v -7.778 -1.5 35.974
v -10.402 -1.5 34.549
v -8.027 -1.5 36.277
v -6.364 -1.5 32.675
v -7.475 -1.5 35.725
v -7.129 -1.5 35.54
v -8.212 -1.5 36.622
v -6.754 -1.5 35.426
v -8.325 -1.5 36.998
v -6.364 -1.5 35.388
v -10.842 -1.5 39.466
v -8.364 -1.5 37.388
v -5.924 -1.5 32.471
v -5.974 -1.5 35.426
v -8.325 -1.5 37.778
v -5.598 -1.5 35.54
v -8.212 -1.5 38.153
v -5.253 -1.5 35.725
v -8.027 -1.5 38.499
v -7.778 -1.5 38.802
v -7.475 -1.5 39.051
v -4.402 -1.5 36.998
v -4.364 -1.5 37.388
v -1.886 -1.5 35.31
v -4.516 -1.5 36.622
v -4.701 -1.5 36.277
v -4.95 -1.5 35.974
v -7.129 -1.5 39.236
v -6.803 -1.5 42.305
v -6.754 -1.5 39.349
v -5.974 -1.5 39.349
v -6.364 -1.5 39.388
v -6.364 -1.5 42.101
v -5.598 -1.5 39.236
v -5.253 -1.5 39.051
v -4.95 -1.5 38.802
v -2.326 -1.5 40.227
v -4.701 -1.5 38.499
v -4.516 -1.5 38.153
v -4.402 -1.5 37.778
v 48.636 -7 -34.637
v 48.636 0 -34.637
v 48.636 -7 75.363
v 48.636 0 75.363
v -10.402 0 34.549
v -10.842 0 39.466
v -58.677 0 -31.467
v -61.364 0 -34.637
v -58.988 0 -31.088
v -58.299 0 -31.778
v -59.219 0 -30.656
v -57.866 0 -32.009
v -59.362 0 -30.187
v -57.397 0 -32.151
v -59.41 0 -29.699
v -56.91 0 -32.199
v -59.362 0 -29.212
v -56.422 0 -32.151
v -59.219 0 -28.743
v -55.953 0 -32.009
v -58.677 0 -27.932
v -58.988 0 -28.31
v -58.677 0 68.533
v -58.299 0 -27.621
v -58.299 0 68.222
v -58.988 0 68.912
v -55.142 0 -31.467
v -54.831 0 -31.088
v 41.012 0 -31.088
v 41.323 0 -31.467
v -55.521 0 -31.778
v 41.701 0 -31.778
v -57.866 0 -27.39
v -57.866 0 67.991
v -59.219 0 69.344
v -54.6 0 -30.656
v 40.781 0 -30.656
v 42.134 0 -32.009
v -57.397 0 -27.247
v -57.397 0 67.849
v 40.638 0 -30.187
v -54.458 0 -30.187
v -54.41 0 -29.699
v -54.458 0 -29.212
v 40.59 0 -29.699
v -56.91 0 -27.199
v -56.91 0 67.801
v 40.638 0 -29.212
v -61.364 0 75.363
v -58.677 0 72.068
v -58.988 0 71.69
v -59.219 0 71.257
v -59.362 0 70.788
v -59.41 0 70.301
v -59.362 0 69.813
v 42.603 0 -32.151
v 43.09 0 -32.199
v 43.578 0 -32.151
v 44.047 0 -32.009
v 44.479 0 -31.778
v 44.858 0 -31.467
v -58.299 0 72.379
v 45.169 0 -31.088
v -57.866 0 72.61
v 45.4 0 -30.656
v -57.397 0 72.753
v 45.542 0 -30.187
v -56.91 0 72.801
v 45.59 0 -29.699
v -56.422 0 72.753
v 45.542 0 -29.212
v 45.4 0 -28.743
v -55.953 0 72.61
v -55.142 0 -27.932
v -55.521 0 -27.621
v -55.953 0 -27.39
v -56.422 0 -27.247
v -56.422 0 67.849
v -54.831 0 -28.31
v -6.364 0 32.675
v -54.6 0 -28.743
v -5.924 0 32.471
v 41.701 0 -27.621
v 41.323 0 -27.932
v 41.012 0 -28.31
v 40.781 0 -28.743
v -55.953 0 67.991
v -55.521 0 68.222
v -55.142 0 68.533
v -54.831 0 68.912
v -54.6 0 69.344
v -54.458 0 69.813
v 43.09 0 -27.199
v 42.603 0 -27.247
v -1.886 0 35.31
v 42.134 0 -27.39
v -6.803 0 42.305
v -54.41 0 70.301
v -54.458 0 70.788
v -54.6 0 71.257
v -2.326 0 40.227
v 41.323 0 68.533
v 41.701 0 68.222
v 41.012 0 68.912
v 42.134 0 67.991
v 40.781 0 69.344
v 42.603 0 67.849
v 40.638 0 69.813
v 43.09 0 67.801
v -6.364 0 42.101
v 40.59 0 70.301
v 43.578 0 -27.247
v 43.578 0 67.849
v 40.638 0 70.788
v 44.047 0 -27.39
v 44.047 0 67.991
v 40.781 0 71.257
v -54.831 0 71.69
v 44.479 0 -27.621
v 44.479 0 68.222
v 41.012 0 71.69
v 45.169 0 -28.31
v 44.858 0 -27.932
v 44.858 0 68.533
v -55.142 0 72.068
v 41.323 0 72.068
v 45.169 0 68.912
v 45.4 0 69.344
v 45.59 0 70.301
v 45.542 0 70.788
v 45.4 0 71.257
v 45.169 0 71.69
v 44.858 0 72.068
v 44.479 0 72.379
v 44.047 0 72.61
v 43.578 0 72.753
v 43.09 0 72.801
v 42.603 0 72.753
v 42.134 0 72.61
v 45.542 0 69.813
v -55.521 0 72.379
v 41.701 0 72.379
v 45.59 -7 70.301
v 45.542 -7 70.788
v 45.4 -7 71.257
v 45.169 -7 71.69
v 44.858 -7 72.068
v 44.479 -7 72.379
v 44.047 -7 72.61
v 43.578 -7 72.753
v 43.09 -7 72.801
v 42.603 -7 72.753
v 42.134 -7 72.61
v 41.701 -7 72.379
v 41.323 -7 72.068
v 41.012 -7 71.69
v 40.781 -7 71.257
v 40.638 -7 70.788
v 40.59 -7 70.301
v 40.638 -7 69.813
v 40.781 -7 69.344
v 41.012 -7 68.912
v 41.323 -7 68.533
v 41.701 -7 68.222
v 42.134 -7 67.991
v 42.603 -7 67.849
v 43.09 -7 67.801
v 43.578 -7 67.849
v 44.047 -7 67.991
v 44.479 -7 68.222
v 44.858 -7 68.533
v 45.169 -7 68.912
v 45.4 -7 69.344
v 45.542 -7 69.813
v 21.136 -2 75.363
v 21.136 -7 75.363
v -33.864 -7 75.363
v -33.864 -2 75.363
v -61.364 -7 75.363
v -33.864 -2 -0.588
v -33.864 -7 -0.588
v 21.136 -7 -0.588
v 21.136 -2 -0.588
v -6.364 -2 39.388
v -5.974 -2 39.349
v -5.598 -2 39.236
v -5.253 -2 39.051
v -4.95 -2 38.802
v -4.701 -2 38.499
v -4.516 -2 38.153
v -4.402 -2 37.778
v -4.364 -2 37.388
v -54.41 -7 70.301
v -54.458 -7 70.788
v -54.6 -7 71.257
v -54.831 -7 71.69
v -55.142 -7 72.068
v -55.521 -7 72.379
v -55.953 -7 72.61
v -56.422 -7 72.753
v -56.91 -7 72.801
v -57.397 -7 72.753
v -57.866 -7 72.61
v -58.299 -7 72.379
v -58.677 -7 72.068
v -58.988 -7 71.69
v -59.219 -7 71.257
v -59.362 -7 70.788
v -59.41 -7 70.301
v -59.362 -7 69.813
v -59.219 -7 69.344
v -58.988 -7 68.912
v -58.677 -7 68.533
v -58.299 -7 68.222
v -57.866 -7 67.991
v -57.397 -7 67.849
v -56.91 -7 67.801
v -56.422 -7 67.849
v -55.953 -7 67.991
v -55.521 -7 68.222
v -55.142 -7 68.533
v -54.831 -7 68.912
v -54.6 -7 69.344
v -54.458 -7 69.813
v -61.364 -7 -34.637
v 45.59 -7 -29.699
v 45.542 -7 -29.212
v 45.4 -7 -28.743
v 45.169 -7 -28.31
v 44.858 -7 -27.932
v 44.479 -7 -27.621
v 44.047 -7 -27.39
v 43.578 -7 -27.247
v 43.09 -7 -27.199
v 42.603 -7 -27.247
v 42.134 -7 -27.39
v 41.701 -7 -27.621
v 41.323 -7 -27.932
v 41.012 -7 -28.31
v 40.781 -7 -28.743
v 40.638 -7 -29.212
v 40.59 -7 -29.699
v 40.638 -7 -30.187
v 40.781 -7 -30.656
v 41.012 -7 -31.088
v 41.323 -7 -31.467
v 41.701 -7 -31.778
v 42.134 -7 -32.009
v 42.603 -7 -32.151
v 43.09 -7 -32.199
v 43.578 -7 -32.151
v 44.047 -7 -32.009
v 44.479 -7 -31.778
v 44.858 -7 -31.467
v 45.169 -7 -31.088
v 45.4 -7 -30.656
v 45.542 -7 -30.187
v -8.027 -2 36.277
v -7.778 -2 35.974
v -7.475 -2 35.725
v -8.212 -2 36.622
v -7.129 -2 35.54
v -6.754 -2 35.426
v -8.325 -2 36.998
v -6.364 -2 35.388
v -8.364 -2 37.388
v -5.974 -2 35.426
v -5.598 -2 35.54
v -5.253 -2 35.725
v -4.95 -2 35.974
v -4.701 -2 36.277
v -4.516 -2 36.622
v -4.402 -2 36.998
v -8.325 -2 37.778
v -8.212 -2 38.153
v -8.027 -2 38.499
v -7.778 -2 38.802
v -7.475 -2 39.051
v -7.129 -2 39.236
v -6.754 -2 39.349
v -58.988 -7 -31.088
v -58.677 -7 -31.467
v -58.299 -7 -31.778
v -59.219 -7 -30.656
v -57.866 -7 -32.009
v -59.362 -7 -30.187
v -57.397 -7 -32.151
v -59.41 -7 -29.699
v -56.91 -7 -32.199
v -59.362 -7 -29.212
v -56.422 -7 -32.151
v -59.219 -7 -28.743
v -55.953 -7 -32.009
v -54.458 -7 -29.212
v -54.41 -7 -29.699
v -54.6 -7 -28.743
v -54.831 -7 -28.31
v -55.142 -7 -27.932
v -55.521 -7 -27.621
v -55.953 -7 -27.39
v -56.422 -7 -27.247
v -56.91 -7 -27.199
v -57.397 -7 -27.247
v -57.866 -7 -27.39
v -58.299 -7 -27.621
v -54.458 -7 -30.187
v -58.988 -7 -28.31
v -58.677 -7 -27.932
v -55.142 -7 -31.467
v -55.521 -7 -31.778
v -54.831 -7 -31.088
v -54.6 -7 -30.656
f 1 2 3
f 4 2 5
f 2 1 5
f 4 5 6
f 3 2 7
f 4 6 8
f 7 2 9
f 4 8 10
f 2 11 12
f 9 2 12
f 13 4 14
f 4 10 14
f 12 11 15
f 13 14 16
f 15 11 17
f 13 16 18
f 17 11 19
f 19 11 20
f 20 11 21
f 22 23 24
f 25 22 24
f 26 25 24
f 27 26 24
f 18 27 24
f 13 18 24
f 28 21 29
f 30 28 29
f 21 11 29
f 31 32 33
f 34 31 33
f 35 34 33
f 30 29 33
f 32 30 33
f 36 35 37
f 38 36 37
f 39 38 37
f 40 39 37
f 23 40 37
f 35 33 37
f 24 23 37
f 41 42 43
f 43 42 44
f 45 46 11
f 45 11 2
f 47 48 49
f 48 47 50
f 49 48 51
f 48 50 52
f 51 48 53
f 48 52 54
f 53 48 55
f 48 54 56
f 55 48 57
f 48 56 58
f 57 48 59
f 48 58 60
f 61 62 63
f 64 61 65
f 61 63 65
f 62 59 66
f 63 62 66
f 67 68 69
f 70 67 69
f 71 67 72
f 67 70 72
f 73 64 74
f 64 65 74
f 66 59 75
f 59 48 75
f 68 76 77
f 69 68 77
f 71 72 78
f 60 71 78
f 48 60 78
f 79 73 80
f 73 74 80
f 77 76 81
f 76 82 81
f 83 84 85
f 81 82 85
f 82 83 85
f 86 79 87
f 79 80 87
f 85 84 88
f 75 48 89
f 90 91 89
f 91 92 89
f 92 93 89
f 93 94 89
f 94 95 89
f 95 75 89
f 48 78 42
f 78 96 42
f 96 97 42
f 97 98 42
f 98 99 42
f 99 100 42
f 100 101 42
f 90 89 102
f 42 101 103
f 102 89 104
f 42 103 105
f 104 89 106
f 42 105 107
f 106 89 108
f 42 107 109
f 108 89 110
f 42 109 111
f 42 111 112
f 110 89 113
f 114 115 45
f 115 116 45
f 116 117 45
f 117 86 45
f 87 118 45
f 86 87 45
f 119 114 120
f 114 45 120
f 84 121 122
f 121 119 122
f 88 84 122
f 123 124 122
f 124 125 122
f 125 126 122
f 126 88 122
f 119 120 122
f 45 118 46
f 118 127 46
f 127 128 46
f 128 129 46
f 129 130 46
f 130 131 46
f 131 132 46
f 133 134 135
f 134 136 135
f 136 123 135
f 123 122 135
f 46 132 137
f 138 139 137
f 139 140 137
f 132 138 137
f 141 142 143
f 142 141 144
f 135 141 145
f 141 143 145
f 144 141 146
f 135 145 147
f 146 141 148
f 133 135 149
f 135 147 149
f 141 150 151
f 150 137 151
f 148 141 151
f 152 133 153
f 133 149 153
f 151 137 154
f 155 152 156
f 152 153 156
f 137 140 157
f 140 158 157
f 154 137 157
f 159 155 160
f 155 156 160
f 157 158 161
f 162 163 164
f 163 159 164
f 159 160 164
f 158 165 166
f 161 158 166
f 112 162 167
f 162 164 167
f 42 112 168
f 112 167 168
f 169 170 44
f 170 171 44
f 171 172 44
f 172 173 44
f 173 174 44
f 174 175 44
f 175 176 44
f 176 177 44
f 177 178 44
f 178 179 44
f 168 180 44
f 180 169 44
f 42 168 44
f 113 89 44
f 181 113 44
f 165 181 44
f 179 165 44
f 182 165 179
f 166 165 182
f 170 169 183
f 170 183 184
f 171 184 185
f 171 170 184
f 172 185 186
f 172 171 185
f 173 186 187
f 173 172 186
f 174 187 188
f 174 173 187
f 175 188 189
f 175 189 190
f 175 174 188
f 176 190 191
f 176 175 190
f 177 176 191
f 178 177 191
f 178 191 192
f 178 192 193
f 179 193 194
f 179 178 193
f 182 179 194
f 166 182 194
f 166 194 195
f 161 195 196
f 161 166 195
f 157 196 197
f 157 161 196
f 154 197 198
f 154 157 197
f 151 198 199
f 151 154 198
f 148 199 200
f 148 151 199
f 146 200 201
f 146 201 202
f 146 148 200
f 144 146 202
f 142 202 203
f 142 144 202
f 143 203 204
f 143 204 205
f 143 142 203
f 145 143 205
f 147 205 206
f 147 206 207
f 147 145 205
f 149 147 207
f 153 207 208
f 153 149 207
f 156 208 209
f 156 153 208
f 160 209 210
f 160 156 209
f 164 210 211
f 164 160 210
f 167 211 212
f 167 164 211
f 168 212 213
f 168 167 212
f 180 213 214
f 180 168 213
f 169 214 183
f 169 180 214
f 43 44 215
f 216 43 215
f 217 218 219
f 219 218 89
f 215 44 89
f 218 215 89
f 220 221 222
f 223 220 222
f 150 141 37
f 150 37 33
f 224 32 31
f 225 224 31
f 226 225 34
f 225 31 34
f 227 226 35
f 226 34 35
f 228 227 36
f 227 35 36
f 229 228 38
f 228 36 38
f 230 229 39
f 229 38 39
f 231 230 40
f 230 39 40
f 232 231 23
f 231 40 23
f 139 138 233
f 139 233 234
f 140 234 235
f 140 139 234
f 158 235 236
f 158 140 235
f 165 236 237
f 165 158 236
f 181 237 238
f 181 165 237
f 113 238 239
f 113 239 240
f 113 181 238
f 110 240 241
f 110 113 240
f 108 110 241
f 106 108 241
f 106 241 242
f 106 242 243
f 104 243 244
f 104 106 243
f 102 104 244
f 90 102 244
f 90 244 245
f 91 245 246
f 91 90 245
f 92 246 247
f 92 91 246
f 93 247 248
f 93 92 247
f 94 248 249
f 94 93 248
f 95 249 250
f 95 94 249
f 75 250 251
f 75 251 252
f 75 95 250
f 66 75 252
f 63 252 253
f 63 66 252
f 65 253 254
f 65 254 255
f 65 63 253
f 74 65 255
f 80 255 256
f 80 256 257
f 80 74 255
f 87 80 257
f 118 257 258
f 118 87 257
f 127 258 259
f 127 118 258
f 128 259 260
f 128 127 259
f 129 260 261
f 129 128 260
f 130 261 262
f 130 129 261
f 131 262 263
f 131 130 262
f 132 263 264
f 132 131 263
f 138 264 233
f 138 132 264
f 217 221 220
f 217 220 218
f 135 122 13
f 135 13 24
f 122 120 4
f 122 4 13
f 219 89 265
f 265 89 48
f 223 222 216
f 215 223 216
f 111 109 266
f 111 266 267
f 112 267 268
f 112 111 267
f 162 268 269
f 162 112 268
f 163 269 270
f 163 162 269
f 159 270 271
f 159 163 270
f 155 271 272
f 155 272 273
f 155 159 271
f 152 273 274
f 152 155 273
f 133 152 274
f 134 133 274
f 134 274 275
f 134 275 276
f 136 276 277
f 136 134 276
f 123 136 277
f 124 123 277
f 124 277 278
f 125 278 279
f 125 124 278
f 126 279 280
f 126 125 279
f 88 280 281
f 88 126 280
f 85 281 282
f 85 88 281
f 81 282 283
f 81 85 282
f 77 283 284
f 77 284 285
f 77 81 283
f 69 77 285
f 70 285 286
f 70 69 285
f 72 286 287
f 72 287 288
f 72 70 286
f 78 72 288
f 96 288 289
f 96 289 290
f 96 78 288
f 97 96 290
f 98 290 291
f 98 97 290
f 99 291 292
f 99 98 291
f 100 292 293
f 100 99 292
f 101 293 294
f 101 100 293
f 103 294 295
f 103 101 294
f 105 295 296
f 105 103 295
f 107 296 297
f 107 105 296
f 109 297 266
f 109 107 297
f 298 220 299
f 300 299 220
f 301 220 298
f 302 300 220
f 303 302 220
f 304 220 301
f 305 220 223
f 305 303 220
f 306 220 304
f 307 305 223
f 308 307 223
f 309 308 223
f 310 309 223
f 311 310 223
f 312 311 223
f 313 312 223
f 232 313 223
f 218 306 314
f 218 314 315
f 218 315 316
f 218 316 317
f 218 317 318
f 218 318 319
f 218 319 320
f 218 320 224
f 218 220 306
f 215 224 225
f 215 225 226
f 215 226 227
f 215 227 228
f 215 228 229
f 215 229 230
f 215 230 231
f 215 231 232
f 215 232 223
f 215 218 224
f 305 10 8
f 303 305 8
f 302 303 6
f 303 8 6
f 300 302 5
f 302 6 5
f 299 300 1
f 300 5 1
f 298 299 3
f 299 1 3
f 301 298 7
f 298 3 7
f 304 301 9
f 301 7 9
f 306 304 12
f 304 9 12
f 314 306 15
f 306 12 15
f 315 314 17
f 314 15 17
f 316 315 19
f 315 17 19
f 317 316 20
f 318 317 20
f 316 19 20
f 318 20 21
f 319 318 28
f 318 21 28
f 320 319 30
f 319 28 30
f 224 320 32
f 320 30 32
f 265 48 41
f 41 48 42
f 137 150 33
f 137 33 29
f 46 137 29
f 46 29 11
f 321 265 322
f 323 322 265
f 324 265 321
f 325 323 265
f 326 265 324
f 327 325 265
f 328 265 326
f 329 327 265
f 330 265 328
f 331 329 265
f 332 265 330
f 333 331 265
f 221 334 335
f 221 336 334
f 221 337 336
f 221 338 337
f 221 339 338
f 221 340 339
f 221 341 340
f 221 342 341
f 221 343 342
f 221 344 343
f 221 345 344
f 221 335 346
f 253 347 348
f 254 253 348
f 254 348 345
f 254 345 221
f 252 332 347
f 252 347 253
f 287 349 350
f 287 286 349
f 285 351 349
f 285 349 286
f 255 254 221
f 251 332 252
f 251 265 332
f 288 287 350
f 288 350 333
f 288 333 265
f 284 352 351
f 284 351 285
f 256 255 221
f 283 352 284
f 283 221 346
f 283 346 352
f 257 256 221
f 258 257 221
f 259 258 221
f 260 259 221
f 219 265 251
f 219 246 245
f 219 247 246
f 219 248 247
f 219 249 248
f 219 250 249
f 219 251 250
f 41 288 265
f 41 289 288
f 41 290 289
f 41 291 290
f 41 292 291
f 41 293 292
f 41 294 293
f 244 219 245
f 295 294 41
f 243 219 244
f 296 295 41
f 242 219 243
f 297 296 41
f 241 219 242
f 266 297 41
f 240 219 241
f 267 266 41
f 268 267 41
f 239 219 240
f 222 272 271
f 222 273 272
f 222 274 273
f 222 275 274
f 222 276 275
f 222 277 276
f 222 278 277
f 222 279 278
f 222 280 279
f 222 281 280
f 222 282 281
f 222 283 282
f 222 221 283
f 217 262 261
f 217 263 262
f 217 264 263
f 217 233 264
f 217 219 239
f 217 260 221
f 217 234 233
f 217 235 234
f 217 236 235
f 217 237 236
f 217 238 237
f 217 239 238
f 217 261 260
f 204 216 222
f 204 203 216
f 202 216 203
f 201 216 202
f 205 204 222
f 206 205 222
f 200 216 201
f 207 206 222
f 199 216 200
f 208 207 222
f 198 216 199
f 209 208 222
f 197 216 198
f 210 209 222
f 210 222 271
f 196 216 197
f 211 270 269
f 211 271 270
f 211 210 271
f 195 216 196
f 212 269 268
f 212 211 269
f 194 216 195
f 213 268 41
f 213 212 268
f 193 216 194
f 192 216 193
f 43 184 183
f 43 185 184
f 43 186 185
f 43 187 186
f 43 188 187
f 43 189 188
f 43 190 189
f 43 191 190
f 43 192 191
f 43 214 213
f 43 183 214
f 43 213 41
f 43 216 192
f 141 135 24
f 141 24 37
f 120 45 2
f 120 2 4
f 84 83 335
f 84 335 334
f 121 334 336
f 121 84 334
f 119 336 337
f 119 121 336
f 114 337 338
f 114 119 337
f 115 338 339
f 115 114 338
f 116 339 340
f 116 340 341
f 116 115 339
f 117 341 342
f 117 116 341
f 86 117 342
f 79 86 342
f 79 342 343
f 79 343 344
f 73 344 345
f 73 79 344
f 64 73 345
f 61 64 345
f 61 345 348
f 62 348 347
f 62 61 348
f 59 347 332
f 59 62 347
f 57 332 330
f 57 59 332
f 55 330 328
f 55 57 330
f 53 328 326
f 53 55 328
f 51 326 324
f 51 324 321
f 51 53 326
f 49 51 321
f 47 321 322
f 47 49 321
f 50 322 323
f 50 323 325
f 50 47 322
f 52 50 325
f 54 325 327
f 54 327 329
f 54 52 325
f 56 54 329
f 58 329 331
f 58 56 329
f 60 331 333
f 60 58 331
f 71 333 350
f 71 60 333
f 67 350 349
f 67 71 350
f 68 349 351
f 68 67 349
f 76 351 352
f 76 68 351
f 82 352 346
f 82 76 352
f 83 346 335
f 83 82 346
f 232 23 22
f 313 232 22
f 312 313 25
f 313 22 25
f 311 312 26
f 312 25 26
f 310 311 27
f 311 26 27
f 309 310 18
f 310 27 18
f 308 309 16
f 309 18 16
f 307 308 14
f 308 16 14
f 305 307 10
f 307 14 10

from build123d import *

# Parameters (mm, degrees)
F0_W     = 27.5
F0_H     = 55
F0_R     = 2.5
F0_H_2   = 20.950978
F1_DEPTH = 7
F2_W     = 55
F2_H     = 75.950978
F3_DEPTH = 5
F4_DEPTH = 1.5


with BuildPart() as f1:
    # F0 (on Front) → F1 (new body)
    with BuildSketch(Plane.XZ):
        with Locations((-47.613798, 47.863281)):
            Rectangle(F0_W, F0_H)
        with Locations((-56.909575, 70.300661)):
            Circle(F0_R, mode=Mode.SUBTRACT)
        Polygon((-33.863798, 20.363281), (-61.363798, 20.363281), (-61.363798, -34.636719), (48.636202, -34.636719), (48.636202, 20.363281), (21.136202, 20.363281), (21.136202, -0.587697), (-6.363798, -0.587697), (-33.863798, -0.587697), align=None)
        with Locations((-56.909575, -29.699339)):
            Circle(F0_R, mode=Mode.SUBTRACT)
        with Locations((43.090425, -29.699339)):
            Circle(F0_R, mode=Mode.SUBTRACT)
        with Locations((34.886202, 47.863281)):
            Rectangle(F0_W, F0_H)
        with Locations((43.090425, 70.300661)):
            Circle(F0_R, mode=Mode.SUBTRACT)
        Polygon((-6.363798, 75.363281), (-33.863798, 75.363281), (-33.863798, 20.363281), (-6.363798, 20.363281), (-6.363798, 32.674998), (-10.402054, 34.54878), (-10.841582, 39.465519), (-6.803326, 42.30453), (-6.363798, 42.100586), align=None)
        Polygon((21.136202, 75.363281), (-6.363798, 75.363281), (-6.363798, 42.100586), (-2.325542, 40.226804), (-1.886014, 35.310065), (-5.92427, 32.471054), (-6.363798, 32.674998), (-6.363798, 20.363281), (21.136202, 20.363281), align=None)
        with Locations((-20.113798, 9.887792)):
            Rectangle(F0_W, F0_H_2)
        with Locations((7.386202, 9.887792)):
            Rectangle(F0_W, F0_H_2)
        with BuildLine():
            Line((-2.325542, 40.226804), (-6.363798, 42.100586))
            Line((-6.363798, 42.100586), (-6.363798, 39.387792))
            ThreePointArc((-6.363798, 39.387792), (-4.949584, 38.802006), (-4.363798, 37.387792))
            ThreePointArc((-4.363798, 37.387792), (-4.949584, 35.973578), (-6.363798, 35.387792))
            Line((-6.363798, 35.387792), (-6.363798, 32.674998))
            Line((-6.363798, 32.674998), (-5.92427, 32.471054))
            Line((-5.92427, 32.471054), (-1.886014, 35.310065))
            Line((-1.886014, 35.310065), (-2.325542, 40.226804))
        make_face()
        with BuildLine():
            Line((-6.363798, 39.387792), (-6.363798, 42.100586))
            Line((-6.363798, 42.100586), (-6.803326, 42.30453))
            Line((-6.803326, 42.30453), (-10.841582, 39.465519))
            Line((-10.841582, 39.465519), (-10.402054, 34.54878))
            Line((-10.402054, 34.54878), (-6.363798, 32.674998))
            Line((-6.363798, 32.674998), (-6.363798, 35.387792))
            ThreePointArc((-6.363798, 35.387792), (-8.363798, 37.387792), (-6.363798, 39.387792))
        make_face()
    extrude(amount=F1_DEPTH)

    # F2 (on face) → F3 (cut)
    with BuildSketch(Plane.XZ.offset(7)):
        with Locations((-6.363798, 37.387792)):
            Rectangle(F2_W, F2_H)
    extrude(amount=-F3_DEPTH, mode=Mode.SUBTRACT)

    # F0 (on Front) → F4 (cut)
    with BuildSketch(Plane.XZ):
        with BuildLine():
            Line((-2.325542, 40.226804), (-6.363798, 42.100586))
            Line((-6.363798, 42.100586), (-6.363798, 39.387792))
            ThreePointArc((-6.363798, 39.387792), (-4.949584, 38.802006), (-4.363798, 37.387792))
            ThreePointArc((-4.363798, 37.387792), (-4.949584, 35.973578), (-6.363798, 35.387792))
            Line((-6.363798, 35.387792), (-6.363798, 32.674998))
            Line((-6.363798, 32.674998), (-5.92427, 32.471054))
            Line((-5.92427, 32.471054), (-1.886014, 35.310065))
            Line((-1.886014, 35.310065), (-2.325542, 40.226804))
        make_face()
        with BuildLine():
            Line((-6.363798, 39.387792), (-6.363798, 42.100586))
            Line((-6.363798, 42.100586), (-6.803326, 42.30453))
            Line((-6.803326, 42.30453), (-10.841582, 39.465519))
            Line((-10.841582, 39.465519), (-10.402054, 34.54878))
            Line((-10.402054, 34.54878), (-6.363798, 32.674998))
            Line((-6.363798, 32.674998), (-6.363798, 35.387792))
            ThreePointArc((-6.363798, 35.387792), (-8.363798, 37.387792), (-6.363798, 39.387792))
        make_face()
    extrude(amount=F4_DEPTH, mode=Mode.SUBTRACT)


solid = f1.part
